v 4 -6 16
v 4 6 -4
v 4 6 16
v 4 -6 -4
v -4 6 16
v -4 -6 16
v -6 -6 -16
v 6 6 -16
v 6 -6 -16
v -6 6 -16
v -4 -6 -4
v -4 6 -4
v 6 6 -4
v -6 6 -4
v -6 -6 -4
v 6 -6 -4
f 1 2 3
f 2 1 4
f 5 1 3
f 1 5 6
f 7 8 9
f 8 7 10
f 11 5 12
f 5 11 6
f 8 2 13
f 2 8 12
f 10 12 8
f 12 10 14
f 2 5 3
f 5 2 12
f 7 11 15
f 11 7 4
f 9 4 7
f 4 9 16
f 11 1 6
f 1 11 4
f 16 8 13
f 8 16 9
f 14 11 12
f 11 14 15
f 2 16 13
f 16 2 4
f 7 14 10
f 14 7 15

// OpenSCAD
size=32; //block=32 //item=8

cube([size*0.25,size*0.375,size*1],center=true);	//arm
translate([0,0,-size*0.3125]){
cube([size*0.375,size*0.375,size*0.375],center=true);	//hinge
};
